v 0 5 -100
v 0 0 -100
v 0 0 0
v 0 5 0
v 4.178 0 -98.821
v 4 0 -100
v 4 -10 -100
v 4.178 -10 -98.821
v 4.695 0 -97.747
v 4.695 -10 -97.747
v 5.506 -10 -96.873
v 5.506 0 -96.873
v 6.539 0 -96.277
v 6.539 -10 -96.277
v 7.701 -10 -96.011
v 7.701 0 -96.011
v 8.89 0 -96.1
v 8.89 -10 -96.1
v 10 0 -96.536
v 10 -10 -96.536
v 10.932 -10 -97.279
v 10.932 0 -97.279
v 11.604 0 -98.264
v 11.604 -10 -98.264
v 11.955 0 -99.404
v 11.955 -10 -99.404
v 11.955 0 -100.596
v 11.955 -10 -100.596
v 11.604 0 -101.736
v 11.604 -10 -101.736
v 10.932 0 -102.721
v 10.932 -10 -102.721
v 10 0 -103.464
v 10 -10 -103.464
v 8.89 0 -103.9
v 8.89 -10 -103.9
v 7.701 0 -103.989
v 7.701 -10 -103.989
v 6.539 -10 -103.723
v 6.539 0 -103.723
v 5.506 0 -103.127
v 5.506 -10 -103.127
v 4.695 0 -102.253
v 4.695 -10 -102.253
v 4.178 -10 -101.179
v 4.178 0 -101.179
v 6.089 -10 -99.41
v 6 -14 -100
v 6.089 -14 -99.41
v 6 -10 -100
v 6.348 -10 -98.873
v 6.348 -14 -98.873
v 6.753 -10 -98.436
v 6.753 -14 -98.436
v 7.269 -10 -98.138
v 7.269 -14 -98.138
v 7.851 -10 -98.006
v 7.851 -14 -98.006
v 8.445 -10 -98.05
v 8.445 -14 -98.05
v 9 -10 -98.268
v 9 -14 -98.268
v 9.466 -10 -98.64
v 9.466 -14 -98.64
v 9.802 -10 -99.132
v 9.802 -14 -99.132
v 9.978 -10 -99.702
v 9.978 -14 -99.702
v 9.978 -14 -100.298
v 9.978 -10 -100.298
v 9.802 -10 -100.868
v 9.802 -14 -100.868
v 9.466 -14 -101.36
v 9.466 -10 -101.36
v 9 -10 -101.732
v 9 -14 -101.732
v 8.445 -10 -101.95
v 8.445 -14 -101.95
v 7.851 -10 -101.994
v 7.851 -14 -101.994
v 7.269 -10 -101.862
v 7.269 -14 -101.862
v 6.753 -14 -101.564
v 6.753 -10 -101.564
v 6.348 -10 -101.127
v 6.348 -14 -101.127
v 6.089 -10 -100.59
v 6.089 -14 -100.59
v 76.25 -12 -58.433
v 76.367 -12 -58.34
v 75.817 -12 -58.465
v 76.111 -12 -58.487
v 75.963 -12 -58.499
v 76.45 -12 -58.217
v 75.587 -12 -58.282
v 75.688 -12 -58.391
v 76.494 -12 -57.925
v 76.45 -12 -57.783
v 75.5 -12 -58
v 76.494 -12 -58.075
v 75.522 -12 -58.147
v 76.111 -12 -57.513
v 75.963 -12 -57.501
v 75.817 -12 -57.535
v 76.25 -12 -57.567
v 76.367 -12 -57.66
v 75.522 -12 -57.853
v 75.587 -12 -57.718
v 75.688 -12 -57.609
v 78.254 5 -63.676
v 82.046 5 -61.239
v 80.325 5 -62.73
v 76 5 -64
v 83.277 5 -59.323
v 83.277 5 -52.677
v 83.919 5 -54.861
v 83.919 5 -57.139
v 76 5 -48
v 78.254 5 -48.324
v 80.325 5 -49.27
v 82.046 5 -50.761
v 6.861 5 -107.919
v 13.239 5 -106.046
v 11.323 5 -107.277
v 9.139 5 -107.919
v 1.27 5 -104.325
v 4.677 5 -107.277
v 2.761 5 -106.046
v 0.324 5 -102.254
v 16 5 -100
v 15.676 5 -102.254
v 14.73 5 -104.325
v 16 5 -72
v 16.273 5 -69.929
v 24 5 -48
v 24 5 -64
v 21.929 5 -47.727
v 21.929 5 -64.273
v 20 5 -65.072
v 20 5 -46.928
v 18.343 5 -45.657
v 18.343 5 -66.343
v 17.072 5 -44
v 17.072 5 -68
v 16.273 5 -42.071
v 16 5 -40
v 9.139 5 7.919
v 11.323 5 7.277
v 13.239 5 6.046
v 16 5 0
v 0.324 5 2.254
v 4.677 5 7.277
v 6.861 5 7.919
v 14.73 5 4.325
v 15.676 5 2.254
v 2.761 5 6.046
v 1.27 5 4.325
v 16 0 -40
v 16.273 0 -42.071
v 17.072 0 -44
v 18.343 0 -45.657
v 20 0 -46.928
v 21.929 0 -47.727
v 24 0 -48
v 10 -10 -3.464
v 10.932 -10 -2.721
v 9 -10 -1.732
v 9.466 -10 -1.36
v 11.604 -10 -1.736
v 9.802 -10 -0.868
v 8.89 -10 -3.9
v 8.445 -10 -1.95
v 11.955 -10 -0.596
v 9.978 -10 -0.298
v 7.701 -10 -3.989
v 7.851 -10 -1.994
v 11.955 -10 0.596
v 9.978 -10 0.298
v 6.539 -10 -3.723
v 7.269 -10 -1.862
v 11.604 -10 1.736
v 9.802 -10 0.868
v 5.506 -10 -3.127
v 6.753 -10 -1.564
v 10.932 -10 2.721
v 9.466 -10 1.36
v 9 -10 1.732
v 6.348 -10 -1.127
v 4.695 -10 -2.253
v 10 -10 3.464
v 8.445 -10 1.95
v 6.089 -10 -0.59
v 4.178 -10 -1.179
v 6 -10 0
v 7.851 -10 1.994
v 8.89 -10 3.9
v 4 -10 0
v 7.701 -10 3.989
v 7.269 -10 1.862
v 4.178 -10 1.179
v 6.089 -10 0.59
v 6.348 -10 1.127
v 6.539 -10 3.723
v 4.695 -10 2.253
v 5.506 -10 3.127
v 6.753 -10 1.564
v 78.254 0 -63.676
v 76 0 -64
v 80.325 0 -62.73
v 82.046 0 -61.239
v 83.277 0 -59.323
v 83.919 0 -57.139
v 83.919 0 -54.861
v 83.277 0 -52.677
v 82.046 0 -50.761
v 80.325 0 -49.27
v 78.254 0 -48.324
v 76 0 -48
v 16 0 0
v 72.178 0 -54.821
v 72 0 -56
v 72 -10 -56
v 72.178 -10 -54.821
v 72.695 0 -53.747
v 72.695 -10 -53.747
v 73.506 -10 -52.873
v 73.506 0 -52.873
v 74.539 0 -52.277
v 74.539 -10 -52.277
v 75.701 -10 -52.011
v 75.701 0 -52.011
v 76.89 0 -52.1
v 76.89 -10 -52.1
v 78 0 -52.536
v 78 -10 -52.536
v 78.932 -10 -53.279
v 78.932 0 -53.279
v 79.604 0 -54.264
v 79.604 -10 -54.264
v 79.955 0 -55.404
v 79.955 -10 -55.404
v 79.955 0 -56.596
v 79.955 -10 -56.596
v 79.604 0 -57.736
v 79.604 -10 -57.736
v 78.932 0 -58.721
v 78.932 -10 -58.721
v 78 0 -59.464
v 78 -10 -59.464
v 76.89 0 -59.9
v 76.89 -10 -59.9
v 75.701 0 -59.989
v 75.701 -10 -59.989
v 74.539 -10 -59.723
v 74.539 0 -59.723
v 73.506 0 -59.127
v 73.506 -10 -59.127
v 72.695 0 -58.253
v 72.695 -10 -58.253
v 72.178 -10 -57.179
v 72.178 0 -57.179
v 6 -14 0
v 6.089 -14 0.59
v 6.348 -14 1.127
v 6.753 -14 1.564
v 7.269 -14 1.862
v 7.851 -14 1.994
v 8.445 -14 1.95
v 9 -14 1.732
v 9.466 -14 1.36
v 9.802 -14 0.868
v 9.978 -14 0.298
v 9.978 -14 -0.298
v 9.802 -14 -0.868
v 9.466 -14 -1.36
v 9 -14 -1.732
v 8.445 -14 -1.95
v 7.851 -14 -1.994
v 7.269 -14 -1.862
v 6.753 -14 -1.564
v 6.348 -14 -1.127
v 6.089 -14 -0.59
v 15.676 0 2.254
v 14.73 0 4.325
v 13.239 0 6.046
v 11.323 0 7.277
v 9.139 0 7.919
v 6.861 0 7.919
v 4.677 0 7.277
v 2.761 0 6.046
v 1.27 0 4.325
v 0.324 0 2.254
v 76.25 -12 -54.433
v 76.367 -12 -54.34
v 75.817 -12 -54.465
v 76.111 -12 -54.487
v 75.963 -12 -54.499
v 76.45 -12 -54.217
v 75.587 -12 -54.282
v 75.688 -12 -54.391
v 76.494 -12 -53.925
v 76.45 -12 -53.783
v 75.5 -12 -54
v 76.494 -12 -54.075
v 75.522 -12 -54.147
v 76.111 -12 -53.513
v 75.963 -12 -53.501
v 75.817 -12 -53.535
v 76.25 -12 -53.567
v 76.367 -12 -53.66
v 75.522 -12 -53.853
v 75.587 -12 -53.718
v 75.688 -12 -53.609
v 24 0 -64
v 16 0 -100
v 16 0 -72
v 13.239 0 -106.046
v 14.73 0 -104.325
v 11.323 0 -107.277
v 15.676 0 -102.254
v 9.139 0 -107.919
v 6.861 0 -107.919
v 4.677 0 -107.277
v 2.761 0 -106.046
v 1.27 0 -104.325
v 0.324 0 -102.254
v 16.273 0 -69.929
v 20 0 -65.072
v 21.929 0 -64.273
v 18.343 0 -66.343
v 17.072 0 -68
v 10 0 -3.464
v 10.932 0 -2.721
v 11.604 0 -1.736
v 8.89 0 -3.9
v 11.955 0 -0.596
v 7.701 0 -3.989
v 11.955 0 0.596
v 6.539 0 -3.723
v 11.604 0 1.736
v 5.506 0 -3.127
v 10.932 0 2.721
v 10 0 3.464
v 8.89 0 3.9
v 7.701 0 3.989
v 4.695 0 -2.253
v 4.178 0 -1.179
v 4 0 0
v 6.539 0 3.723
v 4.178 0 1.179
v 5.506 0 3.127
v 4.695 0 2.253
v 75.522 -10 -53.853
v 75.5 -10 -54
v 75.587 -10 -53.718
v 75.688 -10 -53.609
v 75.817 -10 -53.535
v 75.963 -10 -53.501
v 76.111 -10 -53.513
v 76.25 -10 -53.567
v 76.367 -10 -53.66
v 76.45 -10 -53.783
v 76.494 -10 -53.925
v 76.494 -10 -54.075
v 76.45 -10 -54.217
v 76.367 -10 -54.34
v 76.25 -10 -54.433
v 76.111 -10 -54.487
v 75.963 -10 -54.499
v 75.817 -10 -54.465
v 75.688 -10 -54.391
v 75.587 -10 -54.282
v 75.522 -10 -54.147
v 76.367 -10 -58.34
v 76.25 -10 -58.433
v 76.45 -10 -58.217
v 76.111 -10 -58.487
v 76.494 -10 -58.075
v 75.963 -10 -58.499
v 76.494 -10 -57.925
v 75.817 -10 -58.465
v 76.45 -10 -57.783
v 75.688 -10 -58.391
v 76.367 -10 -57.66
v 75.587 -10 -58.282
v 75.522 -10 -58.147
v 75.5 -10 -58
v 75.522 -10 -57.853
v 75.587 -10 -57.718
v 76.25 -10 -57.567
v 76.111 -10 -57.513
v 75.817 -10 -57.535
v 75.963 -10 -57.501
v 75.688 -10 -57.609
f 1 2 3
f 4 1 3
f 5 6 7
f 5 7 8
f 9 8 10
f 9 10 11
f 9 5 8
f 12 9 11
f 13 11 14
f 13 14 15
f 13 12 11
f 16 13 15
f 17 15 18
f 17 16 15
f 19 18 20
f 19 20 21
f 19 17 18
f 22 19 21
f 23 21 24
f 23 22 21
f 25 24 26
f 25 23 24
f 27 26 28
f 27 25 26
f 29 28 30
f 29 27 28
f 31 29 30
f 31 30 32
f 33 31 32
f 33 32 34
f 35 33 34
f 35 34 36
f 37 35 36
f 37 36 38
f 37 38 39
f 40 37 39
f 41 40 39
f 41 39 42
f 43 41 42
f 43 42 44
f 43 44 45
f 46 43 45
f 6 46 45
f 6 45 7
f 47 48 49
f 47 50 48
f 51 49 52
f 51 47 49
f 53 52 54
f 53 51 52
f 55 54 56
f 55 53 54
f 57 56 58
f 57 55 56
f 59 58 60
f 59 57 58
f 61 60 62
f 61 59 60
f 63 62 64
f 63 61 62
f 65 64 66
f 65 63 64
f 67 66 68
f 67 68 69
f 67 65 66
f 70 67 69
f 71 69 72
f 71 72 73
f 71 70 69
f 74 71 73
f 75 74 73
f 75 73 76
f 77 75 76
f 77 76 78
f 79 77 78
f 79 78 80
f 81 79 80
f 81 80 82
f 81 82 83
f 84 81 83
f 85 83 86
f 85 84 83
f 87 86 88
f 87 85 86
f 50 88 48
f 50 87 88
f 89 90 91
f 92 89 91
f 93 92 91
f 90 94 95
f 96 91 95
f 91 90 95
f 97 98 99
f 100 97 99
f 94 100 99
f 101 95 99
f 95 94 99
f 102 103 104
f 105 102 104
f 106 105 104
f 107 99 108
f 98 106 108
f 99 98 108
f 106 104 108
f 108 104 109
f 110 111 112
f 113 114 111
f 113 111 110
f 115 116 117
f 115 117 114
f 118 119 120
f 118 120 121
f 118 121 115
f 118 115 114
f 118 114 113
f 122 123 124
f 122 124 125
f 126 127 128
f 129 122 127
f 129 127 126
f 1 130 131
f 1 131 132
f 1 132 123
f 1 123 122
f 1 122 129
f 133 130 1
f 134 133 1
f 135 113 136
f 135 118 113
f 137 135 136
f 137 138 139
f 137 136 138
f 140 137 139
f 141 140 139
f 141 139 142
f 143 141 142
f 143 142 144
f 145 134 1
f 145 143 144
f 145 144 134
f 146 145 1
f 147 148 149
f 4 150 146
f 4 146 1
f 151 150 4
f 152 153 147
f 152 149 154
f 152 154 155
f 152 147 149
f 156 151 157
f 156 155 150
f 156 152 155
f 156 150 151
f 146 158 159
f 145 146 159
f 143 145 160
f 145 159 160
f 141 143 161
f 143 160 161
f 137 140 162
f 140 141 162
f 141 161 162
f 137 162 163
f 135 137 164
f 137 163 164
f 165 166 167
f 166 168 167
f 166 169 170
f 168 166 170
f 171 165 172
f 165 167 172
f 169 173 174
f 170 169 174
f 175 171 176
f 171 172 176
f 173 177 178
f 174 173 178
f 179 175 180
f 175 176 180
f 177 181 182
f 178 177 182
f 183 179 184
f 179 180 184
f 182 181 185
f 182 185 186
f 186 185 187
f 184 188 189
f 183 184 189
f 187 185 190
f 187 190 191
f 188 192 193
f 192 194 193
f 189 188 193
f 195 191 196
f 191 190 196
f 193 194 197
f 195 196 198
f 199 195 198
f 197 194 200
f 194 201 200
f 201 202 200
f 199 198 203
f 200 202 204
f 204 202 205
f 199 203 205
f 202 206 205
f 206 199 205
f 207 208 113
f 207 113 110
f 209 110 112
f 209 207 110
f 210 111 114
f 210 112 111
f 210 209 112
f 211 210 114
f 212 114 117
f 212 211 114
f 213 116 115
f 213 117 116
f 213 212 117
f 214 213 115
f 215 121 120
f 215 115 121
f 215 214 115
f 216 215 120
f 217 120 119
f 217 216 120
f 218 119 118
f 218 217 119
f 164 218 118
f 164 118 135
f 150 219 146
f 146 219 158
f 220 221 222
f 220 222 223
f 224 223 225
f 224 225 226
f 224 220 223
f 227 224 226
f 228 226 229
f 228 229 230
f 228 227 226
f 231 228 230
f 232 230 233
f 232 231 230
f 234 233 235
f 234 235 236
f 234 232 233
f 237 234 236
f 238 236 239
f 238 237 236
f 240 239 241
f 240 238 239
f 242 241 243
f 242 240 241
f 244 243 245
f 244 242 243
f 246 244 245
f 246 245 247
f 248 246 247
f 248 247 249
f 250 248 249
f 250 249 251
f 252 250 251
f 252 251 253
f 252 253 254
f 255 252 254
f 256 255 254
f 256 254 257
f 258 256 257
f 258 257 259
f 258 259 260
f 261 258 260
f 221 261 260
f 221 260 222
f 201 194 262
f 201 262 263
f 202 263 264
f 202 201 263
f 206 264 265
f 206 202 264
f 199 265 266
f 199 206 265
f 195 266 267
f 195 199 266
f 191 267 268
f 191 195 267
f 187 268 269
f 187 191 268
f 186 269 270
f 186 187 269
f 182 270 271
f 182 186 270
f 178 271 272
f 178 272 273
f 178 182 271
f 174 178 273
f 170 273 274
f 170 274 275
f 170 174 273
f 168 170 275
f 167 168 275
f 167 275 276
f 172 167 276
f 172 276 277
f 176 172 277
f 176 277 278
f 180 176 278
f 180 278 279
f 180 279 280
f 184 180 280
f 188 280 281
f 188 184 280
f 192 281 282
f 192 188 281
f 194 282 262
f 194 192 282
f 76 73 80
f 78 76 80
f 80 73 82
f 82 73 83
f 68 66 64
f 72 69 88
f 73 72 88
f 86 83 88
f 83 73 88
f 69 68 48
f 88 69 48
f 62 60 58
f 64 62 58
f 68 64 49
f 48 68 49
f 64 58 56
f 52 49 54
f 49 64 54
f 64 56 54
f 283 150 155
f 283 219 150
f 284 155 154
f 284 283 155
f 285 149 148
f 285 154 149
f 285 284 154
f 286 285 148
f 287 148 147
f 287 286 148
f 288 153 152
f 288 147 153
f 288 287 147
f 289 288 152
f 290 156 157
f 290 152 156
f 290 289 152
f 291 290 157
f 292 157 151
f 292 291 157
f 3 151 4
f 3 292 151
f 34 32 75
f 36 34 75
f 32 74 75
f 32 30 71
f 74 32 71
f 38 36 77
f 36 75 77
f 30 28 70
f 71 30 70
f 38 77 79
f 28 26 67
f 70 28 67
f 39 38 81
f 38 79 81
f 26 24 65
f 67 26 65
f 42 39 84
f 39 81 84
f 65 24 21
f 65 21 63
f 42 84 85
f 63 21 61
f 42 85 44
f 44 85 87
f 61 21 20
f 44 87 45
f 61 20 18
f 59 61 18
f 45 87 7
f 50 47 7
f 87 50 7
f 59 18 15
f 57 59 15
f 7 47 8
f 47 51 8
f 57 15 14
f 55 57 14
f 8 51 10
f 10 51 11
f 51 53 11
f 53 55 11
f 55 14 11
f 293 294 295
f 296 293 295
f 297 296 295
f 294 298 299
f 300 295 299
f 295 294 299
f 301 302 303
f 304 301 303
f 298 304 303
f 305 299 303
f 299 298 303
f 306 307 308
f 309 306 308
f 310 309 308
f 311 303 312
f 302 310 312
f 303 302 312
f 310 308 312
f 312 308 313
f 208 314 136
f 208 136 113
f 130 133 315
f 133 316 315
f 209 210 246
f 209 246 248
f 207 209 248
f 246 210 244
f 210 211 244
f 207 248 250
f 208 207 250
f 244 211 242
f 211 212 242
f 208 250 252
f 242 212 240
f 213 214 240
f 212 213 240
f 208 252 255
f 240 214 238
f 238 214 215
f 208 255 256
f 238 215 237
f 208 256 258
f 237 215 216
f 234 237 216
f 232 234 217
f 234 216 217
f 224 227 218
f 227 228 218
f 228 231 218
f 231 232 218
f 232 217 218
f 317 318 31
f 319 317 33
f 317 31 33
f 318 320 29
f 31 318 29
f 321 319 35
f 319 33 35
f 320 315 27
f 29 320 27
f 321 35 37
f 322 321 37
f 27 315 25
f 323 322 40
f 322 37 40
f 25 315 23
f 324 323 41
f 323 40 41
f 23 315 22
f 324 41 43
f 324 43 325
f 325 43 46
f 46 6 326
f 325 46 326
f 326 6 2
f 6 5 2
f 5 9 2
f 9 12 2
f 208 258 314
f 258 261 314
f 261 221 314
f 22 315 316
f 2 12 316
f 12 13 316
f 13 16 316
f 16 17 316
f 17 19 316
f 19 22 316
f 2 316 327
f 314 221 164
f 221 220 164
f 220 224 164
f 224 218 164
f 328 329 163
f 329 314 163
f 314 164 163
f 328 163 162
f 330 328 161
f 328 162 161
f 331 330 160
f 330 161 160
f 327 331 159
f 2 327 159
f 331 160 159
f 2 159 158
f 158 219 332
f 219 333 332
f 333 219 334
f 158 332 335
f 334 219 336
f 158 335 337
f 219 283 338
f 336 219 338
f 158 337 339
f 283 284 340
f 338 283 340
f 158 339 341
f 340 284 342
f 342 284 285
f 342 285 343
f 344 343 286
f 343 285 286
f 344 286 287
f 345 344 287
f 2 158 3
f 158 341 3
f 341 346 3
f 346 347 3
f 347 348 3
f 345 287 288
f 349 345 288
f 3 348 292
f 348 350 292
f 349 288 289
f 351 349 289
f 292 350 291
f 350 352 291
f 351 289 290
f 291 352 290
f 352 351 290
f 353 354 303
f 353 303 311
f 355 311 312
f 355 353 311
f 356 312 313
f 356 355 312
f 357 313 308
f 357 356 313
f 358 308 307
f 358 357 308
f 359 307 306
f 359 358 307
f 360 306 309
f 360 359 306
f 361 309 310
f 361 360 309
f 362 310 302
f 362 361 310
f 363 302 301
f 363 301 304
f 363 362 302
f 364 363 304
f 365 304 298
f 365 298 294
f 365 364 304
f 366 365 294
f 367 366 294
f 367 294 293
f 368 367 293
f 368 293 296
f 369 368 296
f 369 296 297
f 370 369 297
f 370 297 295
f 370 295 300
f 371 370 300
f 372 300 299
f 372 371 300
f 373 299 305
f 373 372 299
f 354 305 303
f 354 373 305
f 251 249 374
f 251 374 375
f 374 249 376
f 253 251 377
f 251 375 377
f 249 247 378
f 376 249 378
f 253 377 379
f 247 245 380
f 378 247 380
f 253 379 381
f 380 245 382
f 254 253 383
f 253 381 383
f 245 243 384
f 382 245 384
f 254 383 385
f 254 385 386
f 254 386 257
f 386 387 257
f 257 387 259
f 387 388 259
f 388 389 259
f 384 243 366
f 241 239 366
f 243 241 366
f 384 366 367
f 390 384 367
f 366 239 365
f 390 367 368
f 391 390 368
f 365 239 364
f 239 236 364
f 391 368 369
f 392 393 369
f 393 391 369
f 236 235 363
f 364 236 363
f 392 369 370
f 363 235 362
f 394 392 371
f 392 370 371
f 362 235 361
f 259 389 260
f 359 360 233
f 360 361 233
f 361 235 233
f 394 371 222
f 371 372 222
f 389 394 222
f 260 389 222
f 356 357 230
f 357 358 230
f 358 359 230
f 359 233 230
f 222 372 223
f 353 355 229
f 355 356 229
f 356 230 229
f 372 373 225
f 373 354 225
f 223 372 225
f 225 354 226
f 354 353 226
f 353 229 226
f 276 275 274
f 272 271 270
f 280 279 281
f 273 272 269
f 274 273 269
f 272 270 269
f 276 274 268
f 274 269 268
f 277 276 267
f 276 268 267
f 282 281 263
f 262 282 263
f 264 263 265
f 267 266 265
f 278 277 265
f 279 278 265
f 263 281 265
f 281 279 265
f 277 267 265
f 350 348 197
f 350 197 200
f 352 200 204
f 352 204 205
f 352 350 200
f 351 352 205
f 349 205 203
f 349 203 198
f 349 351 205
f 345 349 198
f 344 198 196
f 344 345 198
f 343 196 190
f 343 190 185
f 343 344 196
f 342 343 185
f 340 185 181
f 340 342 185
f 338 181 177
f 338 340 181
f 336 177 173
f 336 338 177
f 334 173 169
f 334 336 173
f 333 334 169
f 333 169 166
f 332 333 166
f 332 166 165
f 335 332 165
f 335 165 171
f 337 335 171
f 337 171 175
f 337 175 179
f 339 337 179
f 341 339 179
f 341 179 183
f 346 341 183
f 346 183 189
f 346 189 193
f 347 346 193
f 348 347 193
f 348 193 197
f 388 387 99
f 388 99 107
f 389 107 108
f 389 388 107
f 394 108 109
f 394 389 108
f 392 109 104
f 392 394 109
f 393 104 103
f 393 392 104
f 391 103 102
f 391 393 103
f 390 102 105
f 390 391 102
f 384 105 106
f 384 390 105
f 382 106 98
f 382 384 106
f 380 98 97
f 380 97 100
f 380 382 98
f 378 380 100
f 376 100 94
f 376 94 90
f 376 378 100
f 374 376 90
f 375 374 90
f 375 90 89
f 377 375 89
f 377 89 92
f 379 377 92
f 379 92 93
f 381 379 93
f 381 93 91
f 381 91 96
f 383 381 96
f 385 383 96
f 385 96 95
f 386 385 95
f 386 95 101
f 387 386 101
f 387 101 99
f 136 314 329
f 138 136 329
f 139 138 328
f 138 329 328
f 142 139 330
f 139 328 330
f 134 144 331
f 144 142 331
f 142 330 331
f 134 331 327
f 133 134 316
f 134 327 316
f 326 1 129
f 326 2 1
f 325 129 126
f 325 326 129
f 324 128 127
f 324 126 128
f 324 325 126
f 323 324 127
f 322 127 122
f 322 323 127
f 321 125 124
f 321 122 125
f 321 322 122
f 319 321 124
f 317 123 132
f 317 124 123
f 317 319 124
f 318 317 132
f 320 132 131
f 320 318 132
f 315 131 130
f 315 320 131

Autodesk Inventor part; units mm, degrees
ref_plane "YZ Plane" through (0, 0, 0) normal (1, 0, 0) x (0, 1, 0)
ref_plane "XZ Plane" through (0, 0, 0) normal (0, 1, 0) x (-1, 0, 0)
ref_plane "XY Plane" through (0, 0, 0) normal (0, 0, 1) x (1, 0, 0)
sketch "Boceto1" plane through (0, 0, 0) normal (0, 1, 0) x (-1, 0, 0)
  line L0 (0, -100) -> (0, 0)
  line L1 (-76, -48) -> (-24, -48)
  line L2 (-24, -64) -> (-76, -64)
  arc A0 (-16, -100) -> (0, -100) centre (-8, -100) ccw
  arc A1 (0, 0) -> (-16, 0) centre (-8, 0) ccw
  arc A2 (-76, -48) -> (-76, -64) centre (-76, -56) ccw
  line L3 (-16, 0) -> (-16, -40)
  line L4 (-16, -72) -> (-16, -100)
  arc A3 (-24, -48) -> (-16, -40) centre (-24, -40) ccw
  arc A4 (-16, -72) -> (-24, -64) centre (-24, -72) ccw
  circle A5 centre (-8, 0) radius 4
  circle A6 centre (-8, -100) radius 4
  circle A7 centre (-76, -56) radius 4
  circle A8 centre (-76, -58) radius 0.5
  circle A9 centre (-76, -54) radius 0.5
  circle A10 centre (-8, -100) radius 2
  circle A11 centre (-8, 0) radius 2
  point P0 (-16, -48)
  dimension "d0" = 16
  dimension "d1" = 100
  dimension "d2" = 60
  dimension "d3" = 16
  dimension "d6" = 8
  dimension "d7" = 8
  dimension "d8" = 8
  dimension "d9" = 8
  dimension "d10" = 8
  dimension "d11" = 8
  dimension "d12" = 8
  dimension "d13" = 1
  dimension "d14" = 1
  dimension "d15" = 2
  dimension "d16" = 2
  dimension "d17" = 4
  dimension "d18" = 4
extrude "Extrusión1" add sketch "Boceto1" along normal blind 5 contours A0 L4 A4 L2 A2 L1 A3 L3 A1 L0 | A5 | A6 | A7 | A8 | A9 | A10 | A11
sketch "Boceto4" plane through (0, 0, 0) normal (0, -1, 0) x (1, 0, 0)
  point P0 (0, 0)
extrude "Extrusión3" add sketch "Boceto1" against normal blind 14 contours A10 | A11
sketch "Boceto5" plane through (0, 0, 0) normal (0, -1, 0) x (1, 0, 0)
  point P0 (0, 0)
extrude "Extrusión4" add sketch "Boceto1" against normal blind 12 contours A8 | A9
sketch "Boceto6" plane through (0, 0, 0) normal (0, -1, 0) x (1, 0, 0)
  point P0 (0, 0)
extrude "Extrusión5" add sketch "Boceto1" against normal blind 10 contours A5 | A6 | A7 | A10 | A11
properties part number "Practica 8"
